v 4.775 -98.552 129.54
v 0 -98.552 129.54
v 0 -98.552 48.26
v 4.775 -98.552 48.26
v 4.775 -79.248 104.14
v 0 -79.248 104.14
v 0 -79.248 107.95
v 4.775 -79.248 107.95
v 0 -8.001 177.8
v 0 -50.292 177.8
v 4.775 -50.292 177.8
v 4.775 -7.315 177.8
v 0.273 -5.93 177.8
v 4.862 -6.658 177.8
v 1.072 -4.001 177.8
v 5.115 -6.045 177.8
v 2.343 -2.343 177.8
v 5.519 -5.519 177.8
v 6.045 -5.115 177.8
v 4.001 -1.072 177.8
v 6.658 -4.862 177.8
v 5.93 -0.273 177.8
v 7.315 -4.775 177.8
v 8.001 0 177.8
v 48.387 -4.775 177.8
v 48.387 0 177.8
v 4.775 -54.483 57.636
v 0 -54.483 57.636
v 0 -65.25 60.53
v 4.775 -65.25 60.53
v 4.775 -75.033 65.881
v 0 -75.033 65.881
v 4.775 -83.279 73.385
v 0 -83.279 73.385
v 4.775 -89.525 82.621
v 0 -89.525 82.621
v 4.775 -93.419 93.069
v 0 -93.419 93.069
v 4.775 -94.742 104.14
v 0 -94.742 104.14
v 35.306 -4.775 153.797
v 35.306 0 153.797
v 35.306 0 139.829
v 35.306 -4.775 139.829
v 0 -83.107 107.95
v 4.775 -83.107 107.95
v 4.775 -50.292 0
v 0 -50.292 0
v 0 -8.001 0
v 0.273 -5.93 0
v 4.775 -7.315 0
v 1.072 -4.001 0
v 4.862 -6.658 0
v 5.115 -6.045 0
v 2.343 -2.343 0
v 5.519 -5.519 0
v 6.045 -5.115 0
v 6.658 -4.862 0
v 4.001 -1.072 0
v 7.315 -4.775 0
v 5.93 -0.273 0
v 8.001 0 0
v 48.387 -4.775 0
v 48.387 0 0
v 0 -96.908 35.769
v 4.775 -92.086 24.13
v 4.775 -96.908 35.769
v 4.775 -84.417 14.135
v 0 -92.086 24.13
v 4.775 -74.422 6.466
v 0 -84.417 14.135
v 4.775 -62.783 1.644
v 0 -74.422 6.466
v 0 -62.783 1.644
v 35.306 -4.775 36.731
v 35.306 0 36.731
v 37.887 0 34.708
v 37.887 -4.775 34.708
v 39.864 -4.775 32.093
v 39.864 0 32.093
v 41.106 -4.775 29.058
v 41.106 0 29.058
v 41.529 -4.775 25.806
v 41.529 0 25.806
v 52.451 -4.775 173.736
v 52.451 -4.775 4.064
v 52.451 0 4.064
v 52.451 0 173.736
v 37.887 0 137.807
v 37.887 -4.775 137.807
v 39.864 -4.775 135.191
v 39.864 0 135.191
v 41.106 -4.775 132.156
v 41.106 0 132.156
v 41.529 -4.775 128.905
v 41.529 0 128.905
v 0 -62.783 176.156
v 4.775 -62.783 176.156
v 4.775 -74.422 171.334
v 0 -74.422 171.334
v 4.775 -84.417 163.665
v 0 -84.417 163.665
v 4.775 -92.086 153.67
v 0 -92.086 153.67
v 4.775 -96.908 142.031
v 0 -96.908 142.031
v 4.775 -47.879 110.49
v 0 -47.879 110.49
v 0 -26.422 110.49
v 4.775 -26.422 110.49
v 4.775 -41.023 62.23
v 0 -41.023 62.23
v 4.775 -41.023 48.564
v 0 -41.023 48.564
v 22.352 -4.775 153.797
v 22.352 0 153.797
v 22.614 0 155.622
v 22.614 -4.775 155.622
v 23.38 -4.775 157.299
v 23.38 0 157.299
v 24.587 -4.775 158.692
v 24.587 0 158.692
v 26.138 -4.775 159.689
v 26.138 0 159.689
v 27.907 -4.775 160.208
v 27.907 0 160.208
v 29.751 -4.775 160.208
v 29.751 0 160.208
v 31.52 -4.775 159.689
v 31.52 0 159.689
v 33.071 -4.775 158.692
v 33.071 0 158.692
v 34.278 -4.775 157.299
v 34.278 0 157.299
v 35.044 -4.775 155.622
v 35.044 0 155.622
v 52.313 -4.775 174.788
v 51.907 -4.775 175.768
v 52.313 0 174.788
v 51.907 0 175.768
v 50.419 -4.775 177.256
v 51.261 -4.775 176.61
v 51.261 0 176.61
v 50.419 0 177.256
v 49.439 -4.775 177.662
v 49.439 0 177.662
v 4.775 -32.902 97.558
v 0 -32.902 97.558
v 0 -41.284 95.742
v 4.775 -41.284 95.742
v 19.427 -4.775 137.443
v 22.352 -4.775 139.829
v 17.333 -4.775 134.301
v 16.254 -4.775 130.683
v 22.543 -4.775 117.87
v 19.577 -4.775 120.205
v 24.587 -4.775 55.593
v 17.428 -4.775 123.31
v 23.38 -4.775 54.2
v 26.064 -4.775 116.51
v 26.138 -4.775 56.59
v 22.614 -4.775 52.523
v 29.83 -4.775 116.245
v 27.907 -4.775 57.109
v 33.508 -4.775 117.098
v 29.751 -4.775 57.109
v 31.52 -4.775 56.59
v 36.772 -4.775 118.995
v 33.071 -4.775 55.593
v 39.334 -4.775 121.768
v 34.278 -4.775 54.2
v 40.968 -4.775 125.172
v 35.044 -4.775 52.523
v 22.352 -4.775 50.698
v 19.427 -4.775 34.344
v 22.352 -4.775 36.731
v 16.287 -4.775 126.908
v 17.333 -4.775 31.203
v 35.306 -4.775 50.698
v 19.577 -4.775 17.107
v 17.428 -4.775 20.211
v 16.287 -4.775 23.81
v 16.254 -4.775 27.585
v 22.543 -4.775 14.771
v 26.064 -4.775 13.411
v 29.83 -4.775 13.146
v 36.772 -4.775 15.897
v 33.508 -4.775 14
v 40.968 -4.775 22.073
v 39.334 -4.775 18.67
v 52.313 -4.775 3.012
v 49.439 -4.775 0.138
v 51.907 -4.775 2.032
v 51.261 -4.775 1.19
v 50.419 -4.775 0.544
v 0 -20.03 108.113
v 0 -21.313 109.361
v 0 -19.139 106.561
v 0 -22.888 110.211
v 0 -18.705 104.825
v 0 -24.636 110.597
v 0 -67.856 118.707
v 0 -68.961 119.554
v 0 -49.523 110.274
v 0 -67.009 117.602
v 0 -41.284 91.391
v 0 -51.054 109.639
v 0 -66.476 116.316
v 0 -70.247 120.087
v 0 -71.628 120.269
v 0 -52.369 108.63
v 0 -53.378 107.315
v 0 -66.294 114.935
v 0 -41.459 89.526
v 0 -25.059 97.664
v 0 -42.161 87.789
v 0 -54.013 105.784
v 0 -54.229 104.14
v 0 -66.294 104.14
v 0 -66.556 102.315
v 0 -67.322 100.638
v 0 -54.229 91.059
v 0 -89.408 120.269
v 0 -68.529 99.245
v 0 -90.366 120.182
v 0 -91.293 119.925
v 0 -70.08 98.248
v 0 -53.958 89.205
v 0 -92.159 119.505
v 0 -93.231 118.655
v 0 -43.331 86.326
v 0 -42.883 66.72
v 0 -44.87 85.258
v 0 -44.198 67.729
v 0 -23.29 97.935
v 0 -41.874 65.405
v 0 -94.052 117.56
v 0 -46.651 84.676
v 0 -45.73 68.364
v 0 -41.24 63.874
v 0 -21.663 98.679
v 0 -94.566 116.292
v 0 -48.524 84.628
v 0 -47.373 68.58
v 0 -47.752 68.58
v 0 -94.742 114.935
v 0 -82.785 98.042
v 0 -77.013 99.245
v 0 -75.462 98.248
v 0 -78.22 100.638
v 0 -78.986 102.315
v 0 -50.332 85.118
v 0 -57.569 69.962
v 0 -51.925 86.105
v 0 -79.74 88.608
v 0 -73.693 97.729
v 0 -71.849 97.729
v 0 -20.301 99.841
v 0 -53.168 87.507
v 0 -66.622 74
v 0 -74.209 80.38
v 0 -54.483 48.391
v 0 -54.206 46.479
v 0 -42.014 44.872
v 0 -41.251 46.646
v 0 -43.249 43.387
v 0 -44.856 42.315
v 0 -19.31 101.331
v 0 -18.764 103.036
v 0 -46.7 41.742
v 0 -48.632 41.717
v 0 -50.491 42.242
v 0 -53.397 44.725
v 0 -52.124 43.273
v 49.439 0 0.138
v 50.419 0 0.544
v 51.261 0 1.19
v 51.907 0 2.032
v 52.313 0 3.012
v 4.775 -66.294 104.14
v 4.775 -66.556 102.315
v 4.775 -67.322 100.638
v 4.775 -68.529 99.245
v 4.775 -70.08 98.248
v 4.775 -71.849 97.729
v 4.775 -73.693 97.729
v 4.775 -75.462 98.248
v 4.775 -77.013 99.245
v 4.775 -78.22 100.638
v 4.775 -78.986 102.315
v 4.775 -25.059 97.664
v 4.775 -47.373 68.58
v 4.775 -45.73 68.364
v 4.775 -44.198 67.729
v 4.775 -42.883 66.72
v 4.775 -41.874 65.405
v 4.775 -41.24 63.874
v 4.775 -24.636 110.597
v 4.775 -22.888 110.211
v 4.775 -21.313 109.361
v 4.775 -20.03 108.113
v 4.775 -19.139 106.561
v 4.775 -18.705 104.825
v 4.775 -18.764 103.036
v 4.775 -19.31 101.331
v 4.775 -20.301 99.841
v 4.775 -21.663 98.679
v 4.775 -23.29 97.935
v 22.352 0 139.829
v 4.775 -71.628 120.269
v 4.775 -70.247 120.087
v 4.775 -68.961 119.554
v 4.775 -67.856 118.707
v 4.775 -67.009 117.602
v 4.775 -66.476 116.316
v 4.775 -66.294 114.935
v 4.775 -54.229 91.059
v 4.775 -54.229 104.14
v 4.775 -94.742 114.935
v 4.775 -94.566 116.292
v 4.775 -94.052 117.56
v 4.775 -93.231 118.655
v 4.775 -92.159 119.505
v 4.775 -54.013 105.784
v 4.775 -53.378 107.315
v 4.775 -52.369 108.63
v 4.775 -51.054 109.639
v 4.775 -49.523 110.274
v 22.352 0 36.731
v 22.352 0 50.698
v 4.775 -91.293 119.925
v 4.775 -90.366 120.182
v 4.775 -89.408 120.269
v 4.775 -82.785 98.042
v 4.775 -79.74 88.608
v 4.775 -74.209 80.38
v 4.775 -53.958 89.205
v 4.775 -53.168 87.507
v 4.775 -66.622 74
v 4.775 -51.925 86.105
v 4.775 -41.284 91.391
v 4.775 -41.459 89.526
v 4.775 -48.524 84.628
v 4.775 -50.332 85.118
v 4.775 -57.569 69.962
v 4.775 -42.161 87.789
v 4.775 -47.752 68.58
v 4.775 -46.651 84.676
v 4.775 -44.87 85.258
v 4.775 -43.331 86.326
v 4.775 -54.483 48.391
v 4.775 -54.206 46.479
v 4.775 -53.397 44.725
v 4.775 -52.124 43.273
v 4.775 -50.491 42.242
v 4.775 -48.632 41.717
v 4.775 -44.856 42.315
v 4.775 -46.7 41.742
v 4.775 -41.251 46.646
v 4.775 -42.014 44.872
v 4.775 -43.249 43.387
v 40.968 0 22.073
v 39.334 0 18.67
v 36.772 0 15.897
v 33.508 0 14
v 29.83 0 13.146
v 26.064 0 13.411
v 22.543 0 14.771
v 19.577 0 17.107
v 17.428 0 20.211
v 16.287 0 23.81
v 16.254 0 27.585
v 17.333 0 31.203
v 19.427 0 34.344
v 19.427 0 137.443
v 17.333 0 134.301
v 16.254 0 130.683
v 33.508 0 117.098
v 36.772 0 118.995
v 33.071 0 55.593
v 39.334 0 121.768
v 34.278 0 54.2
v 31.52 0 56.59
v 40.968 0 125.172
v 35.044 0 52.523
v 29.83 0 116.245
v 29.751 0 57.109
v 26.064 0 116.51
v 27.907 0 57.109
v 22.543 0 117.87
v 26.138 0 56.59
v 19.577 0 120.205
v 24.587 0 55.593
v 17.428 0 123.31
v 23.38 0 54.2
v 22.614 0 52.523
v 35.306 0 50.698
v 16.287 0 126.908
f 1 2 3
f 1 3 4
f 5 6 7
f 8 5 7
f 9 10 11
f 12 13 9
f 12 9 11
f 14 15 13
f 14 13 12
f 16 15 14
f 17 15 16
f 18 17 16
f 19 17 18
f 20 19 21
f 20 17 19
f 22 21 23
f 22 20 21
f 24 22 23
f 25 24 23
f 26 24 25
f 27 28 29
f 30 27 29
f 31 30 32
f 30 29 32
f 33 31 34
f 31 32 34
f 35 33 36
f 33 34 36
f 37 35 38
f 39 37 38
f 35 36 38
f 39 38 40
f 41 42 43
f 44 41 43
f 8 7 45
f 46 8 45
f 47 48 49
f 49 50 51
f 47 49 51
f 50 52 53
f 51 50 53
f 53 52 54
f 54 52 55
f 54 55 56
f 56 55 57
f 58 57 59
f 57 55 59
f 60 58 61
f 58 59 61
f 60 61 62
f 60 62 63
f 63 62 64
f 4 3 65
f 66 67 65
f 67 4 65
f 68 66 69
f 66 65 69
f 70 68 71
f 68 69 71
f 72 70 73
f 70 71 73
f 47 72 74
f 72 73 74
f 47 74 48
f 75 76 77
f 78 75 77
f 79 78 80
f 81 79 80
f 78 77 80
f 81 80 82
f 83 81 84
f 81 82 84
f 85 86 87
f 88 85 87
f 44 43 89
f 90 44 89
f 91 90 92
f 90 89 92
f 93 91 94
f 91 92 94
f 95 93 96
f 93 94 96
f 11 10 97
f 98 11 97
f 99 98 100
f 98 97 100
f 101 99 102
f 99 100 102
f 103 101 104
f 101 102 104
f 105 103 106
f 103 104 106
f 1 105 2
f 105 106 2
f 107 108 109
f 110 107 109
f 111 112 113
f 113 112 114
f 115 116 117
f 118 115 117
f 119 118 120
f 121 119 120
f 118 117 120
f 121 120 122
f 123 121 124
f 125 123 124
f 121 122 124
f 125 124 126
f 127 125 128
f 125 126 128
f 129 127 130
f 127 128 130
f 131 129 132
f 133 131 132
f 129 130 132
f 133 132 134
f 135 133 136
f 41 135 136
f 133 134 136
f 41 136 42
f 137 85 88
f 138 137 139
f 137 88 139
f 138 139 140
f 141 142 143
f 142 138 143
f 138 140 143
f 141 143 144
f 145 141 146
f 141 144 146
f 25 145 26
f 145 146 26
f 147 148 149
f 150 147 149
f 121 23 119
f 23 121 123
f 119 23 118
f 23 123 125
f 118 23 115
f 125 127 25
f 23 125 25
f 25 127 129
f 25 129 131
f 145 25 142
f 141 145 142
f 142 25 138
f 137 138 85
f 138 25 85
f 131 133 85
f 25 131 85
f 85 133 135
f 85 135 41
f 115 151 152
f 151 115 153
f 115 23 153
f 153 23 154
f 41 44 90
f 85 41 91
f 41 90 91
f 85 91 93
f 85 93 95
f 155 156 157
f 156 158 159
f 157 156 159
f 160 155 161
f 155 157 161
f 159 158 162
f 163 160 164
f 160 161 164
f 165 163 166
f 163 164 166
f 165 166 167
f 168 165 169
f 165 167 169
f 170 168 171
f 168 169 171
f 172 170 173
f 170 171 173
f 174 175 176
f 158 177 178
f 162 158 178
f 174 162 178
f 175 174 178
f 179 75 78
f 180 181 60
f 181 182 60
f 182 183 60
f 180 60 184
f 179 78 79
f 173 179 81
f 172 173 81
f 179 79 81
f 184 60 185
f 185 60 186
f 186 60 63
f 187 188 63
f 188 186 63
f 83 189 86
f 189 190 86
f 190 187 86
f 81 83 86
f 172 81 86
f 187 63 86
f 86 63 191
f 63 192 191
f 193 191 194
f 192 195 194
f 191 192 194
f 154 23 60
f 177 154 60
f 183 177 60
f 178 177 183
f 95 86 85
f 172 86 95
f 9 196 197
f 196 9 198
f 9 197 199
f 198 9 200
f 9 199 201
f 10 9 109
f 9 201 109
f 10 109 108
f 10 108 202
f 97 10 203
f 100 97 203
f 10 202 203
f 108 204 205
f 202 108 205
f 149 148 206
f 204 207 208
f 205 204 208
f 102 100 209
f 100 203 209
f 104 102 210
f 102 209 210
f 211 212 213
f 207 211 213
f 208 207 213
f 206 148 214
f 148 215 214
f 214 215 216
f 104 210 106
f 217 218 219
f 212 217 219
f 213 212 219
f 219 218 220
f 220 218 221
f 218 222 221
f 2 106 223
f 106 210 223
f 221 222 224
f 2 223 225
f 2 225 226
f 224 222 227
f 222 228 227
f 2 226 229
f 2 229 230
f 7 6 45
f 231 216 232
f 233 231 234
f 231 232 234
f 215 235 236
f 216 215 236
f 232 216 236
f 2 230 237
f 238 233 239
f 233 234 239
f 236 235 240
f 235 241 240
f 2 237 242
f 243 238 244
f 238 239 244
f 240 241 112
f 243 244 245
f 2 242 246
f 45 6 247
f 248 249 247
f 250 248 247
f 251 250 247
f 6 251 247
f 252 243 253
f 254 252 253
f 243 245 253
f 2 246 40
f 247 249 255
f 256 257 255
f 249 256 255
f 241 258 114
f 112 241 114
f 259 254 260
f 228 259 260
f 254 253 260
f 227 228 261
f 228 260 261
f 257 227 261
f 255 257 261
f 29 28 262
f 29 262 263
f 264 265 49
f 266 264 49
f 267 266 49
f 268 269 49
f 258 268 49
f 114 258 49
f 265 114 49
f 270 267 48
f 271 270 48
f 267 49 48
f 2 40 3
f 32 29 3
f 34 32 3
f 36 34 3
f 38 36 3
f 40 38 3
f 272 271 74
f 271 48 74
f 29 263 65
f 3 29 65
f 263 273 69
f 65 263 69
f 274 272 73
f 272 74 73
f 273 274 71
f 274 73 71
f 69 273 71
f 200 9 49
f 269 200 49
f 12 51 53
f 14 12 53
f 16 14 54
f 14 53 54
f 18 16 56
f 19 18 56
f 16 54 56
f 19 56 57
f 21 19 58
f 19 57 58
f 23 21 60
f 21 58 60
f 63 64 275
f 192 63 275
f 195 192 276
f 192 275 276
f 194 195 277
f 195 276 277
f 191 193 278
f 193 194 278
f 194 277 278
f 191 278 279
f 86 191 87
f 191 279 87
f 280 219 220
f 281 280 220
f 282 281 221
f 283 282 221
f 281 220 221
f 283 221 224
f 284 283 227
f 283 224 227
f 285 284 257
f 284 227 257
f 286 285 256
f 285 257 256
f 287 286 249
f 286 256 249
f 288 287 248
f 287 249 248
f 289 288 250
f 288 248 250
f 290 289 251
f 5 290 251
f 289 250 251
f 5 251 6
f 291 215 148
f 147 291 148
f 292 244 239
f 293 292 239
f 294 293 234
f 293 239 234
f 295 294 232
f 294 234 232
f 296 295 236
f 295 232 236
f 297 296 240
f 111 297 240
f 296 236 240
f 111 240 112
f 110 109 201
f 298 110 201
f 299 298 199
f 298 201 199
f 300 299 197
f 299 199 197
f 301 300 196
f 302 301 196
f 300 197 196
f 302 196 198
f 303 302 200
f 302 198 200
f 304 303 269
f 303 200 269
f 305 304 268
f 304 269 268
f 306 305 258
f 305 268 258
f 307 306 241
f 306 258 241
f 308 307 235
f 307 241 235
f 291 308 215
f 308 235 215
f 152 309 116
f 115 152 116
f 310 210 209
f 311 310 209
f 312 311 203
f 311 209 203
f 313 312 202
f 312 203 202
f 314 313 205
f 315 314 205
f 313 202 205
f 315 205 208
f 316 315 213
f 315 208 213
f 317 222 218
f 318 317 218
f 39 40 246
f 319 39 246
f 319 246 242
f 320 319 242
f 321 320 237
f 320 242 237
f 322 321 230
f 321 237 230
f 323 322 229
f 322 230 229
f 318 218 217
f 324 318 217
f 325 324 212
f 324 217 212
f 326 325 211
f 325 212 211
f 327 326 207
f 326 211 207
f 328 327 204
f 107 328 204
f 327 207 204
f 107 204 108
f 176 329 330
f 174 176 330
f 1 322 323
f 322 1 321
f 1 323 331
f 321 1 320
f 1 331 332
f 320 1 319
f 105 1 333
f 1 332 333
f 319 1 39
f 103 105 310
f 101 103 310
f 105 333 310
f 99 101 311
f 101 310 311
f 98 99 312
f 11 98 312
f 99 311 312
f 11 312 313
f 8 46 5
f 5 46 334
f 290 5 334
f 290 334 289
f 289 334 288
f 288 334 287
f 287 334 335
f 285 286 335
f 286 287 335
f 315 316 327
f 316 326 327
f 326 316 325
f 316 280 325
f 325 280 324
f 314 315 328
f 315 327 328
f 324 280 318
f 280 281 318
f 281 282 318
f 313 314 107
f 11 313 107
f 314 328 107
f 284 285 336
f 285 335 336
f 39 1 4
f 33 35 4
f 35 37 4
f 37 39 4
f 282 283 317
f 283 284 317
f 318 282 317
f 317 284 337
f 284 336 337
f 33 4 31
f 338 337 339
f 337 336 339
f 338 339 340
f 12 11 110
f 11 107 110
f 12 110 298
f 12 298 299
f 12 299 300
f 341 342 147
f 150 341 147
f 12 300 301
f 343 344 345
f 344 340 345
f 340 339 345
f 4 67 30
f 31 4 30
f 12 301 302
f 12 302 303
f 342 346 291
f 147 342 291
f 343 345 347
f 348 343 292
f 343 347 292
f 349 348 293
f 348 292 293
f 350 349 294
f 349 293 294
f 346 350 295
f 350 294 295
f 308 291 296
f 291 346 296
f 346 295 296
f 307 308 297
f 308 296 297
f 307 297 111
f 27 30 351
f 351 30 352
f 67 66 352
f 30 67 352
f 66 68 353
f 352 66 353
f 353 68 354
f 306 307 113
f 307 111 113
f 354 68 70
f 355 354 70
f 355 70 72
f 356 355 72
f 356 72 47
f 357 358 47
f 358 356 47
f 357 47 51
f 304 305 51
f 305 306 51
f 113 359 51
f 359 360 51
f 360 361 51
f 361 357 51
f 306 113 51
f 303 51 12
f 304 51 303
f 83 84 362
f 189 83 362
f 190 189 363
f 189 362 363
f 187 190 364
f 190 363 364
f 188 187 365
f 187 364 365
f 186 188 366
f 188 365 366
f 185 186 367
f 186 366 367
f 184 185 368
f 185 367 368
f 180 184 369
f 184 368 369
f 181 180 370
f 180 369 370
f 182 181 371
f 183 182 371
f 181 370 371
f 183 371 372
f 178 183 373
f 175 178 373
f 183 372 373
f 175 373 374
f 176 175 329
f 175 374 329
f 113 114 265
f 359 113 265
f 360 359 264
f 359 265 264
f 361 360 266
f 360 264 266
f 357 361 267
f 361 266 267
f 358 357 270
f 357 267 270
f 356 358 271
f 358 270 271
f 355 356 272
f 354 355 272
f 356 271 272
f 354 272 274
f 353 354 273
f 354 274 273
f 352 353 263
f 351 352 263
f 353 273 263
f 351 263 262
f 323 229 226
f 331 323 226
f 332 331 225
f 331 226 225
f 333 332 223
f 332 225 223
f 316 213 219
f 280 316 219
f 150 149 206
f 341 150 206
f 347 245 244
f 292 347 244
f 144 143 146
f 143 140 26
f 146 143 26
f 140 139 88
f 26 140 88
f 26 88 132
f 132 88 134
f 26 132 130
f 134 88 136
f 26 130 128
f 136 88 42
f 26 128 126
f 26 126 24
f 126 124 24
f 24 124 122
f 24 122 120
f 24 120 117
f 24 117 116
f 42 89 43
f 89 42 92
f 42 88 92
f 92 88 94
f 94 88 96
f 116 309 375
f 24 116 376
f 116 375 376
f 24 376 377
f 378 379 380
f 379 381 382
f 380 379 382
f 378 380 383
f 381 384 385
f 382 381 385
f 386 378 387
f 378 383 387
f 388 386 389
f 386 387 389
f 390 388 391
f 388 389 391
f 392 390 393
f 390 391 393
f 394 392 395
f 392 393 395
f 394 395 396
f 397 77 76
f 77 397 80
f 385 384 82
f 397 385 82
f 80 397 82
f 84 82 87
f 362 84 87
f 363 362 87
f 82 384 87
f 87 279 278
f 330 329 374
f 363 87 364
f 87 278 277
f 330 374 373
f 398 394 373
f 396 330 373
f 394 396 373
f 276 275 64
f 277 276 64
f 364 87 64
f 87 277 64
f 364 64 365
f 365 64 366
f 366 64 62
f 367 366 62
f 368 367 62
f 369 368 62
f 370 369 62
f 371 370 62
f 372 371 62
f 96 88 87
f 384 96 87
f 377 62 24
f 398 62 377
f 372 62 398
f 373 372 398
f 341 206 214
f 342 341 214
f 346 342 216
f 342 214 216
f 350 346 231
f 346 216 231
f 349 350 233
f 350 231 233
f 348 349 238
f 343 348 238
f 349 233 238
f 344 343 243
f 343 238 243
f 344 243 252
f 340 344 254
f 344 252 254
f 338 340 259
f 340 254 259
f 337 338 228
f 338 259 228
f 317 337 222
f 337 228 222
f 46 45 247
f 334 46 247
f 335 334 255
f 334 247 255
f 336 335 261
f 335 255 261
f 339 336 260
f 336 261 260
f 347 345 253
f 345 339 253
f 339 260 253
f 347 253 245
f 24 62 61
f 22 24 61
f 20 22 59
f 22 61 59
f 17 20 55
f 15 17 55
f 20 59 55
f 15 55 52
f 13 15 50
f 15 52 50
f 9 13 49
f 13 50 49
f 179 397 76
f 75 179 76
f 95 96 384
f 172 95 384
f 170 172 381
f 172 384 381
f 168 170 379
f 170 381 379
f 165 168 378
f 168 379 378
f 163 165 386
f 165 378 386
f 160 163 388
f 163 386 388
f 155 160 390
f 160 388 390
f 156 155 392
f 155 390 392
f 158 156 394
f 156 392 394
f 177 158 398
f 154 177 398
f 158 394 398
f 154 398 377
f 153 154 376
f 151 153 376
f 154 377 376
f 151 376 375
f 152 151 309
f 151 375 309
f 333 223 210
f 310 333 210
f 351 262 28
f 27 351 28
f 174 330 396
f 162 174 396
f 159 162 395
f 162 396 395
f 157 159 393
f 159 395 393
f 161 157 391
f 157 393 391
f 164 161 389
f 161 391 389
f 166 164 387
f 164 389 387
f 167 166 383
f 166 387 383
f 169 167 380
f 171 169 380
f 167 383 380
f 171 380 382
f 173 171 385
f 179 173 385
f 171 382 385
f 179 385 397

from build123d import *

# Parameters (mm, degrees)
F1_DEPTH = 177.8
F3_DEPTH = 98.553
F5_DEPTH = 52.452


with BuildPart() as f1:
    # F0 (on Top) → F1 (new body)
    with BuildSketch(Plane.XY):
        with BuildLine():
            Line((52.451, 0), (8.001, 0))
            ThreePointArc((8.001, 0), (2.343439, -2.343439), (0, -8.001))
            Line((0, -8.001), (0, -98.552))
            Line((0, -98.552), (4.7752, -98.552))
            Line((4.7752, -98.552), (4.7752, -7.3152))
            ThreePointArc((4.7752, -7.3152), (5.519149, -5.519149), (7.3152, -4.7752))
            Line((7.3152, -4.7752), (52.451, -4.7752))
            Line((52.451, -4.7752), (52.451, 0))
        make_face()
    extrude(amount=F1_DEPTH)

    # F2 (on face) → F3 (cut, through all)
    with BuildSketch(Plane(origin=(0, 0, 0), x_dir=(-1, 0, 0), z_dir=(0, 1, 0))):
        with BuildLine():
            ThreePointArc((-52.451, 173.736), (-51.260682, 176.609682), (-48.387, 177.8))
            Line((-48.387, 177.8), (-52.451, 177.8))
            Line((-52.451, 177.8), (-52.451, 173.736))
        make_face()
        with BuildLine():
            ThreePointArc((-48.387, 0), (-51.260682, 1.190318), (-52.451, 4.064))
            Line((-52.451, 4.064), (-52.451, 0))
            Line((-52.451, 0), (-48.387, 0))
        make_face()
        with BuildLine():
            Line((-35.306, 50.6984), (-35.306, 36.730615))
            ThreePointArc((-35.306, 36.730615), (-39.864123, 32.092579), (-41.529, 25.8064))
            ThreePointArc((-41.529, 25.8064), (-22.542821, 14.771277), (-22.352, 36.730615))
            Line((-22.352, 36.730615), (-22.352, 50.6984))
            ThreePointArc((-22.352, 50.6984), (-28.829, 57.1754), (-35.306, 50.6984))
        make_face()
        with BuildLine():
            Line((-35.306, 153.797), (-35.306, 139.829215))
            ThreePointArc((-35.306, 139.829215), (-39.864123, 135.191179), (-41.529, 128.905))
            ThreePointArc((-41.529, 128.905), (-22.542821, 117.869877), (-22.352, 139.829215))
            Line((-22.352, 139.829215), (-22.352, 153.797))
            ThreePointArc((-22.352, 153.797), (-28.829, 160.274), (-35.306, 153.797))
        make_face()
    extrude(amount=-F3_DEPTH, mode=Mode.SUBTRACT)

    # F4 (on face) → F5 (cut, through all)
    with BuildSketch(Plane(origin=(0, 0, 0), x_dir=(0, -1, 0), z_dir=(-1, 0, 0))):
        with BuildLine():
            ThreePointArc((92.15891, 119.504907), (94.091728, 111.930262), (94.742, 104.14))
            Line((94.742, 104.14), (94.742, 114.935))
            ThreePointArc((94.742, 114.935), (94.051539, 117.55971), (92.15891, 119.504907))
        make_face()
        with BuildLine():
            Line((54.229, 91.059), (54.229, 104.14))
            ThreePointArc((54.229, 104.14), (52.369128, 108.630128), (47.879, 110.49))
            Line((47.879, 110.49), (26.422334, 110.49))
            ThreePointArc((26.422334, 110.49), (18.705275, 104.824536), (25.059111, 97.663583))
            Line((25.059111, 97.663583), (32.901534, 97.558367))
            Line((32.901534, 97.558367), (41.283534, 95.742102))
            Line((41.283534, 95.742102), (41.283534, 91.391388))
            ThreePointArc((41.283534, 91.391388), (47.585751, 84.584134), (54.229, 91.059))
        make_face()
        with BuildLine():
            ThreePointArc((54.483, 57.635603), (83.279054, 73.385138), (94.742, 104.14))
            ThreePointArc((94.742, 104.14), (94.091728, 111.930262), (92.15891, 119.504907))
            ThreePointArc((92.15891, 119.504907), (90.835528, 120.074428), (89.408, 120.269))
            Line((89.408, 120.269), (71.628, 120.269))
            ThreePointArc((71.628, 120.269), (67.856292, 118.706708), (66.294, 114.935))
            Line((66.294, 114.935), (66.294, 104.14))
            Line((66.294, 104.14), (72.771, 104.14))
            Line((72.771, 104.14), (79.248, 104.14))
            Line((79.248, 104.14), (79.248, 107.95))
            Line((79.248, 107.95), (83.107304, 107.95))
            ThreePointArc((83.107304, 107.95), (74.209487, 80.380476), (47.752, 68.58))
            Line((47.752, 68.58), (47.373243, 68.58))
            ThreePointArc((47.373243, 68.58), (42.883115, 66.720128), (41.023243, 62.23))
            Line((41.023243, 62.23), (41.023243, 48.564316))
            ThreePointArc((41.023243, 48.564316), (47.665111, 41.660113), (54.483, 48.390552))
            Line((54.483, 48.390552), (54.483, 57.635603))
        make_face()
        with BuildLine():
            Line((72.771, 104.14), (66.294, 104.14))
            ThreePointArc((66.294, 104.14), (72.771, 97.663), (79.248, 104.14))
            Line((79.248, 104.14), (72.771, 104.14))
        make_face()
        with BuildLine():
            Line((98.552, 0), (98.552, 48.26))
            ThreePointArc((98.552, 48.26), (84.416973, 14.135027), (50.292, 0))
            Line((50.292, 0), (98.552, 0))
        make_face()
        with BuildLine():
            Line((98.552, 177.8), (50.292, 177.8))
            ThreePointArc((50.292, 177.8), (84.416973, 163.664973), (98.552, 129.54))
            Line((98.552, 129.54), (98.552, 177.8))
        make_face()
    extrude(amount=-F5_DEPTH, mode=Mode.SUBTRACT)


solid = f1.part
